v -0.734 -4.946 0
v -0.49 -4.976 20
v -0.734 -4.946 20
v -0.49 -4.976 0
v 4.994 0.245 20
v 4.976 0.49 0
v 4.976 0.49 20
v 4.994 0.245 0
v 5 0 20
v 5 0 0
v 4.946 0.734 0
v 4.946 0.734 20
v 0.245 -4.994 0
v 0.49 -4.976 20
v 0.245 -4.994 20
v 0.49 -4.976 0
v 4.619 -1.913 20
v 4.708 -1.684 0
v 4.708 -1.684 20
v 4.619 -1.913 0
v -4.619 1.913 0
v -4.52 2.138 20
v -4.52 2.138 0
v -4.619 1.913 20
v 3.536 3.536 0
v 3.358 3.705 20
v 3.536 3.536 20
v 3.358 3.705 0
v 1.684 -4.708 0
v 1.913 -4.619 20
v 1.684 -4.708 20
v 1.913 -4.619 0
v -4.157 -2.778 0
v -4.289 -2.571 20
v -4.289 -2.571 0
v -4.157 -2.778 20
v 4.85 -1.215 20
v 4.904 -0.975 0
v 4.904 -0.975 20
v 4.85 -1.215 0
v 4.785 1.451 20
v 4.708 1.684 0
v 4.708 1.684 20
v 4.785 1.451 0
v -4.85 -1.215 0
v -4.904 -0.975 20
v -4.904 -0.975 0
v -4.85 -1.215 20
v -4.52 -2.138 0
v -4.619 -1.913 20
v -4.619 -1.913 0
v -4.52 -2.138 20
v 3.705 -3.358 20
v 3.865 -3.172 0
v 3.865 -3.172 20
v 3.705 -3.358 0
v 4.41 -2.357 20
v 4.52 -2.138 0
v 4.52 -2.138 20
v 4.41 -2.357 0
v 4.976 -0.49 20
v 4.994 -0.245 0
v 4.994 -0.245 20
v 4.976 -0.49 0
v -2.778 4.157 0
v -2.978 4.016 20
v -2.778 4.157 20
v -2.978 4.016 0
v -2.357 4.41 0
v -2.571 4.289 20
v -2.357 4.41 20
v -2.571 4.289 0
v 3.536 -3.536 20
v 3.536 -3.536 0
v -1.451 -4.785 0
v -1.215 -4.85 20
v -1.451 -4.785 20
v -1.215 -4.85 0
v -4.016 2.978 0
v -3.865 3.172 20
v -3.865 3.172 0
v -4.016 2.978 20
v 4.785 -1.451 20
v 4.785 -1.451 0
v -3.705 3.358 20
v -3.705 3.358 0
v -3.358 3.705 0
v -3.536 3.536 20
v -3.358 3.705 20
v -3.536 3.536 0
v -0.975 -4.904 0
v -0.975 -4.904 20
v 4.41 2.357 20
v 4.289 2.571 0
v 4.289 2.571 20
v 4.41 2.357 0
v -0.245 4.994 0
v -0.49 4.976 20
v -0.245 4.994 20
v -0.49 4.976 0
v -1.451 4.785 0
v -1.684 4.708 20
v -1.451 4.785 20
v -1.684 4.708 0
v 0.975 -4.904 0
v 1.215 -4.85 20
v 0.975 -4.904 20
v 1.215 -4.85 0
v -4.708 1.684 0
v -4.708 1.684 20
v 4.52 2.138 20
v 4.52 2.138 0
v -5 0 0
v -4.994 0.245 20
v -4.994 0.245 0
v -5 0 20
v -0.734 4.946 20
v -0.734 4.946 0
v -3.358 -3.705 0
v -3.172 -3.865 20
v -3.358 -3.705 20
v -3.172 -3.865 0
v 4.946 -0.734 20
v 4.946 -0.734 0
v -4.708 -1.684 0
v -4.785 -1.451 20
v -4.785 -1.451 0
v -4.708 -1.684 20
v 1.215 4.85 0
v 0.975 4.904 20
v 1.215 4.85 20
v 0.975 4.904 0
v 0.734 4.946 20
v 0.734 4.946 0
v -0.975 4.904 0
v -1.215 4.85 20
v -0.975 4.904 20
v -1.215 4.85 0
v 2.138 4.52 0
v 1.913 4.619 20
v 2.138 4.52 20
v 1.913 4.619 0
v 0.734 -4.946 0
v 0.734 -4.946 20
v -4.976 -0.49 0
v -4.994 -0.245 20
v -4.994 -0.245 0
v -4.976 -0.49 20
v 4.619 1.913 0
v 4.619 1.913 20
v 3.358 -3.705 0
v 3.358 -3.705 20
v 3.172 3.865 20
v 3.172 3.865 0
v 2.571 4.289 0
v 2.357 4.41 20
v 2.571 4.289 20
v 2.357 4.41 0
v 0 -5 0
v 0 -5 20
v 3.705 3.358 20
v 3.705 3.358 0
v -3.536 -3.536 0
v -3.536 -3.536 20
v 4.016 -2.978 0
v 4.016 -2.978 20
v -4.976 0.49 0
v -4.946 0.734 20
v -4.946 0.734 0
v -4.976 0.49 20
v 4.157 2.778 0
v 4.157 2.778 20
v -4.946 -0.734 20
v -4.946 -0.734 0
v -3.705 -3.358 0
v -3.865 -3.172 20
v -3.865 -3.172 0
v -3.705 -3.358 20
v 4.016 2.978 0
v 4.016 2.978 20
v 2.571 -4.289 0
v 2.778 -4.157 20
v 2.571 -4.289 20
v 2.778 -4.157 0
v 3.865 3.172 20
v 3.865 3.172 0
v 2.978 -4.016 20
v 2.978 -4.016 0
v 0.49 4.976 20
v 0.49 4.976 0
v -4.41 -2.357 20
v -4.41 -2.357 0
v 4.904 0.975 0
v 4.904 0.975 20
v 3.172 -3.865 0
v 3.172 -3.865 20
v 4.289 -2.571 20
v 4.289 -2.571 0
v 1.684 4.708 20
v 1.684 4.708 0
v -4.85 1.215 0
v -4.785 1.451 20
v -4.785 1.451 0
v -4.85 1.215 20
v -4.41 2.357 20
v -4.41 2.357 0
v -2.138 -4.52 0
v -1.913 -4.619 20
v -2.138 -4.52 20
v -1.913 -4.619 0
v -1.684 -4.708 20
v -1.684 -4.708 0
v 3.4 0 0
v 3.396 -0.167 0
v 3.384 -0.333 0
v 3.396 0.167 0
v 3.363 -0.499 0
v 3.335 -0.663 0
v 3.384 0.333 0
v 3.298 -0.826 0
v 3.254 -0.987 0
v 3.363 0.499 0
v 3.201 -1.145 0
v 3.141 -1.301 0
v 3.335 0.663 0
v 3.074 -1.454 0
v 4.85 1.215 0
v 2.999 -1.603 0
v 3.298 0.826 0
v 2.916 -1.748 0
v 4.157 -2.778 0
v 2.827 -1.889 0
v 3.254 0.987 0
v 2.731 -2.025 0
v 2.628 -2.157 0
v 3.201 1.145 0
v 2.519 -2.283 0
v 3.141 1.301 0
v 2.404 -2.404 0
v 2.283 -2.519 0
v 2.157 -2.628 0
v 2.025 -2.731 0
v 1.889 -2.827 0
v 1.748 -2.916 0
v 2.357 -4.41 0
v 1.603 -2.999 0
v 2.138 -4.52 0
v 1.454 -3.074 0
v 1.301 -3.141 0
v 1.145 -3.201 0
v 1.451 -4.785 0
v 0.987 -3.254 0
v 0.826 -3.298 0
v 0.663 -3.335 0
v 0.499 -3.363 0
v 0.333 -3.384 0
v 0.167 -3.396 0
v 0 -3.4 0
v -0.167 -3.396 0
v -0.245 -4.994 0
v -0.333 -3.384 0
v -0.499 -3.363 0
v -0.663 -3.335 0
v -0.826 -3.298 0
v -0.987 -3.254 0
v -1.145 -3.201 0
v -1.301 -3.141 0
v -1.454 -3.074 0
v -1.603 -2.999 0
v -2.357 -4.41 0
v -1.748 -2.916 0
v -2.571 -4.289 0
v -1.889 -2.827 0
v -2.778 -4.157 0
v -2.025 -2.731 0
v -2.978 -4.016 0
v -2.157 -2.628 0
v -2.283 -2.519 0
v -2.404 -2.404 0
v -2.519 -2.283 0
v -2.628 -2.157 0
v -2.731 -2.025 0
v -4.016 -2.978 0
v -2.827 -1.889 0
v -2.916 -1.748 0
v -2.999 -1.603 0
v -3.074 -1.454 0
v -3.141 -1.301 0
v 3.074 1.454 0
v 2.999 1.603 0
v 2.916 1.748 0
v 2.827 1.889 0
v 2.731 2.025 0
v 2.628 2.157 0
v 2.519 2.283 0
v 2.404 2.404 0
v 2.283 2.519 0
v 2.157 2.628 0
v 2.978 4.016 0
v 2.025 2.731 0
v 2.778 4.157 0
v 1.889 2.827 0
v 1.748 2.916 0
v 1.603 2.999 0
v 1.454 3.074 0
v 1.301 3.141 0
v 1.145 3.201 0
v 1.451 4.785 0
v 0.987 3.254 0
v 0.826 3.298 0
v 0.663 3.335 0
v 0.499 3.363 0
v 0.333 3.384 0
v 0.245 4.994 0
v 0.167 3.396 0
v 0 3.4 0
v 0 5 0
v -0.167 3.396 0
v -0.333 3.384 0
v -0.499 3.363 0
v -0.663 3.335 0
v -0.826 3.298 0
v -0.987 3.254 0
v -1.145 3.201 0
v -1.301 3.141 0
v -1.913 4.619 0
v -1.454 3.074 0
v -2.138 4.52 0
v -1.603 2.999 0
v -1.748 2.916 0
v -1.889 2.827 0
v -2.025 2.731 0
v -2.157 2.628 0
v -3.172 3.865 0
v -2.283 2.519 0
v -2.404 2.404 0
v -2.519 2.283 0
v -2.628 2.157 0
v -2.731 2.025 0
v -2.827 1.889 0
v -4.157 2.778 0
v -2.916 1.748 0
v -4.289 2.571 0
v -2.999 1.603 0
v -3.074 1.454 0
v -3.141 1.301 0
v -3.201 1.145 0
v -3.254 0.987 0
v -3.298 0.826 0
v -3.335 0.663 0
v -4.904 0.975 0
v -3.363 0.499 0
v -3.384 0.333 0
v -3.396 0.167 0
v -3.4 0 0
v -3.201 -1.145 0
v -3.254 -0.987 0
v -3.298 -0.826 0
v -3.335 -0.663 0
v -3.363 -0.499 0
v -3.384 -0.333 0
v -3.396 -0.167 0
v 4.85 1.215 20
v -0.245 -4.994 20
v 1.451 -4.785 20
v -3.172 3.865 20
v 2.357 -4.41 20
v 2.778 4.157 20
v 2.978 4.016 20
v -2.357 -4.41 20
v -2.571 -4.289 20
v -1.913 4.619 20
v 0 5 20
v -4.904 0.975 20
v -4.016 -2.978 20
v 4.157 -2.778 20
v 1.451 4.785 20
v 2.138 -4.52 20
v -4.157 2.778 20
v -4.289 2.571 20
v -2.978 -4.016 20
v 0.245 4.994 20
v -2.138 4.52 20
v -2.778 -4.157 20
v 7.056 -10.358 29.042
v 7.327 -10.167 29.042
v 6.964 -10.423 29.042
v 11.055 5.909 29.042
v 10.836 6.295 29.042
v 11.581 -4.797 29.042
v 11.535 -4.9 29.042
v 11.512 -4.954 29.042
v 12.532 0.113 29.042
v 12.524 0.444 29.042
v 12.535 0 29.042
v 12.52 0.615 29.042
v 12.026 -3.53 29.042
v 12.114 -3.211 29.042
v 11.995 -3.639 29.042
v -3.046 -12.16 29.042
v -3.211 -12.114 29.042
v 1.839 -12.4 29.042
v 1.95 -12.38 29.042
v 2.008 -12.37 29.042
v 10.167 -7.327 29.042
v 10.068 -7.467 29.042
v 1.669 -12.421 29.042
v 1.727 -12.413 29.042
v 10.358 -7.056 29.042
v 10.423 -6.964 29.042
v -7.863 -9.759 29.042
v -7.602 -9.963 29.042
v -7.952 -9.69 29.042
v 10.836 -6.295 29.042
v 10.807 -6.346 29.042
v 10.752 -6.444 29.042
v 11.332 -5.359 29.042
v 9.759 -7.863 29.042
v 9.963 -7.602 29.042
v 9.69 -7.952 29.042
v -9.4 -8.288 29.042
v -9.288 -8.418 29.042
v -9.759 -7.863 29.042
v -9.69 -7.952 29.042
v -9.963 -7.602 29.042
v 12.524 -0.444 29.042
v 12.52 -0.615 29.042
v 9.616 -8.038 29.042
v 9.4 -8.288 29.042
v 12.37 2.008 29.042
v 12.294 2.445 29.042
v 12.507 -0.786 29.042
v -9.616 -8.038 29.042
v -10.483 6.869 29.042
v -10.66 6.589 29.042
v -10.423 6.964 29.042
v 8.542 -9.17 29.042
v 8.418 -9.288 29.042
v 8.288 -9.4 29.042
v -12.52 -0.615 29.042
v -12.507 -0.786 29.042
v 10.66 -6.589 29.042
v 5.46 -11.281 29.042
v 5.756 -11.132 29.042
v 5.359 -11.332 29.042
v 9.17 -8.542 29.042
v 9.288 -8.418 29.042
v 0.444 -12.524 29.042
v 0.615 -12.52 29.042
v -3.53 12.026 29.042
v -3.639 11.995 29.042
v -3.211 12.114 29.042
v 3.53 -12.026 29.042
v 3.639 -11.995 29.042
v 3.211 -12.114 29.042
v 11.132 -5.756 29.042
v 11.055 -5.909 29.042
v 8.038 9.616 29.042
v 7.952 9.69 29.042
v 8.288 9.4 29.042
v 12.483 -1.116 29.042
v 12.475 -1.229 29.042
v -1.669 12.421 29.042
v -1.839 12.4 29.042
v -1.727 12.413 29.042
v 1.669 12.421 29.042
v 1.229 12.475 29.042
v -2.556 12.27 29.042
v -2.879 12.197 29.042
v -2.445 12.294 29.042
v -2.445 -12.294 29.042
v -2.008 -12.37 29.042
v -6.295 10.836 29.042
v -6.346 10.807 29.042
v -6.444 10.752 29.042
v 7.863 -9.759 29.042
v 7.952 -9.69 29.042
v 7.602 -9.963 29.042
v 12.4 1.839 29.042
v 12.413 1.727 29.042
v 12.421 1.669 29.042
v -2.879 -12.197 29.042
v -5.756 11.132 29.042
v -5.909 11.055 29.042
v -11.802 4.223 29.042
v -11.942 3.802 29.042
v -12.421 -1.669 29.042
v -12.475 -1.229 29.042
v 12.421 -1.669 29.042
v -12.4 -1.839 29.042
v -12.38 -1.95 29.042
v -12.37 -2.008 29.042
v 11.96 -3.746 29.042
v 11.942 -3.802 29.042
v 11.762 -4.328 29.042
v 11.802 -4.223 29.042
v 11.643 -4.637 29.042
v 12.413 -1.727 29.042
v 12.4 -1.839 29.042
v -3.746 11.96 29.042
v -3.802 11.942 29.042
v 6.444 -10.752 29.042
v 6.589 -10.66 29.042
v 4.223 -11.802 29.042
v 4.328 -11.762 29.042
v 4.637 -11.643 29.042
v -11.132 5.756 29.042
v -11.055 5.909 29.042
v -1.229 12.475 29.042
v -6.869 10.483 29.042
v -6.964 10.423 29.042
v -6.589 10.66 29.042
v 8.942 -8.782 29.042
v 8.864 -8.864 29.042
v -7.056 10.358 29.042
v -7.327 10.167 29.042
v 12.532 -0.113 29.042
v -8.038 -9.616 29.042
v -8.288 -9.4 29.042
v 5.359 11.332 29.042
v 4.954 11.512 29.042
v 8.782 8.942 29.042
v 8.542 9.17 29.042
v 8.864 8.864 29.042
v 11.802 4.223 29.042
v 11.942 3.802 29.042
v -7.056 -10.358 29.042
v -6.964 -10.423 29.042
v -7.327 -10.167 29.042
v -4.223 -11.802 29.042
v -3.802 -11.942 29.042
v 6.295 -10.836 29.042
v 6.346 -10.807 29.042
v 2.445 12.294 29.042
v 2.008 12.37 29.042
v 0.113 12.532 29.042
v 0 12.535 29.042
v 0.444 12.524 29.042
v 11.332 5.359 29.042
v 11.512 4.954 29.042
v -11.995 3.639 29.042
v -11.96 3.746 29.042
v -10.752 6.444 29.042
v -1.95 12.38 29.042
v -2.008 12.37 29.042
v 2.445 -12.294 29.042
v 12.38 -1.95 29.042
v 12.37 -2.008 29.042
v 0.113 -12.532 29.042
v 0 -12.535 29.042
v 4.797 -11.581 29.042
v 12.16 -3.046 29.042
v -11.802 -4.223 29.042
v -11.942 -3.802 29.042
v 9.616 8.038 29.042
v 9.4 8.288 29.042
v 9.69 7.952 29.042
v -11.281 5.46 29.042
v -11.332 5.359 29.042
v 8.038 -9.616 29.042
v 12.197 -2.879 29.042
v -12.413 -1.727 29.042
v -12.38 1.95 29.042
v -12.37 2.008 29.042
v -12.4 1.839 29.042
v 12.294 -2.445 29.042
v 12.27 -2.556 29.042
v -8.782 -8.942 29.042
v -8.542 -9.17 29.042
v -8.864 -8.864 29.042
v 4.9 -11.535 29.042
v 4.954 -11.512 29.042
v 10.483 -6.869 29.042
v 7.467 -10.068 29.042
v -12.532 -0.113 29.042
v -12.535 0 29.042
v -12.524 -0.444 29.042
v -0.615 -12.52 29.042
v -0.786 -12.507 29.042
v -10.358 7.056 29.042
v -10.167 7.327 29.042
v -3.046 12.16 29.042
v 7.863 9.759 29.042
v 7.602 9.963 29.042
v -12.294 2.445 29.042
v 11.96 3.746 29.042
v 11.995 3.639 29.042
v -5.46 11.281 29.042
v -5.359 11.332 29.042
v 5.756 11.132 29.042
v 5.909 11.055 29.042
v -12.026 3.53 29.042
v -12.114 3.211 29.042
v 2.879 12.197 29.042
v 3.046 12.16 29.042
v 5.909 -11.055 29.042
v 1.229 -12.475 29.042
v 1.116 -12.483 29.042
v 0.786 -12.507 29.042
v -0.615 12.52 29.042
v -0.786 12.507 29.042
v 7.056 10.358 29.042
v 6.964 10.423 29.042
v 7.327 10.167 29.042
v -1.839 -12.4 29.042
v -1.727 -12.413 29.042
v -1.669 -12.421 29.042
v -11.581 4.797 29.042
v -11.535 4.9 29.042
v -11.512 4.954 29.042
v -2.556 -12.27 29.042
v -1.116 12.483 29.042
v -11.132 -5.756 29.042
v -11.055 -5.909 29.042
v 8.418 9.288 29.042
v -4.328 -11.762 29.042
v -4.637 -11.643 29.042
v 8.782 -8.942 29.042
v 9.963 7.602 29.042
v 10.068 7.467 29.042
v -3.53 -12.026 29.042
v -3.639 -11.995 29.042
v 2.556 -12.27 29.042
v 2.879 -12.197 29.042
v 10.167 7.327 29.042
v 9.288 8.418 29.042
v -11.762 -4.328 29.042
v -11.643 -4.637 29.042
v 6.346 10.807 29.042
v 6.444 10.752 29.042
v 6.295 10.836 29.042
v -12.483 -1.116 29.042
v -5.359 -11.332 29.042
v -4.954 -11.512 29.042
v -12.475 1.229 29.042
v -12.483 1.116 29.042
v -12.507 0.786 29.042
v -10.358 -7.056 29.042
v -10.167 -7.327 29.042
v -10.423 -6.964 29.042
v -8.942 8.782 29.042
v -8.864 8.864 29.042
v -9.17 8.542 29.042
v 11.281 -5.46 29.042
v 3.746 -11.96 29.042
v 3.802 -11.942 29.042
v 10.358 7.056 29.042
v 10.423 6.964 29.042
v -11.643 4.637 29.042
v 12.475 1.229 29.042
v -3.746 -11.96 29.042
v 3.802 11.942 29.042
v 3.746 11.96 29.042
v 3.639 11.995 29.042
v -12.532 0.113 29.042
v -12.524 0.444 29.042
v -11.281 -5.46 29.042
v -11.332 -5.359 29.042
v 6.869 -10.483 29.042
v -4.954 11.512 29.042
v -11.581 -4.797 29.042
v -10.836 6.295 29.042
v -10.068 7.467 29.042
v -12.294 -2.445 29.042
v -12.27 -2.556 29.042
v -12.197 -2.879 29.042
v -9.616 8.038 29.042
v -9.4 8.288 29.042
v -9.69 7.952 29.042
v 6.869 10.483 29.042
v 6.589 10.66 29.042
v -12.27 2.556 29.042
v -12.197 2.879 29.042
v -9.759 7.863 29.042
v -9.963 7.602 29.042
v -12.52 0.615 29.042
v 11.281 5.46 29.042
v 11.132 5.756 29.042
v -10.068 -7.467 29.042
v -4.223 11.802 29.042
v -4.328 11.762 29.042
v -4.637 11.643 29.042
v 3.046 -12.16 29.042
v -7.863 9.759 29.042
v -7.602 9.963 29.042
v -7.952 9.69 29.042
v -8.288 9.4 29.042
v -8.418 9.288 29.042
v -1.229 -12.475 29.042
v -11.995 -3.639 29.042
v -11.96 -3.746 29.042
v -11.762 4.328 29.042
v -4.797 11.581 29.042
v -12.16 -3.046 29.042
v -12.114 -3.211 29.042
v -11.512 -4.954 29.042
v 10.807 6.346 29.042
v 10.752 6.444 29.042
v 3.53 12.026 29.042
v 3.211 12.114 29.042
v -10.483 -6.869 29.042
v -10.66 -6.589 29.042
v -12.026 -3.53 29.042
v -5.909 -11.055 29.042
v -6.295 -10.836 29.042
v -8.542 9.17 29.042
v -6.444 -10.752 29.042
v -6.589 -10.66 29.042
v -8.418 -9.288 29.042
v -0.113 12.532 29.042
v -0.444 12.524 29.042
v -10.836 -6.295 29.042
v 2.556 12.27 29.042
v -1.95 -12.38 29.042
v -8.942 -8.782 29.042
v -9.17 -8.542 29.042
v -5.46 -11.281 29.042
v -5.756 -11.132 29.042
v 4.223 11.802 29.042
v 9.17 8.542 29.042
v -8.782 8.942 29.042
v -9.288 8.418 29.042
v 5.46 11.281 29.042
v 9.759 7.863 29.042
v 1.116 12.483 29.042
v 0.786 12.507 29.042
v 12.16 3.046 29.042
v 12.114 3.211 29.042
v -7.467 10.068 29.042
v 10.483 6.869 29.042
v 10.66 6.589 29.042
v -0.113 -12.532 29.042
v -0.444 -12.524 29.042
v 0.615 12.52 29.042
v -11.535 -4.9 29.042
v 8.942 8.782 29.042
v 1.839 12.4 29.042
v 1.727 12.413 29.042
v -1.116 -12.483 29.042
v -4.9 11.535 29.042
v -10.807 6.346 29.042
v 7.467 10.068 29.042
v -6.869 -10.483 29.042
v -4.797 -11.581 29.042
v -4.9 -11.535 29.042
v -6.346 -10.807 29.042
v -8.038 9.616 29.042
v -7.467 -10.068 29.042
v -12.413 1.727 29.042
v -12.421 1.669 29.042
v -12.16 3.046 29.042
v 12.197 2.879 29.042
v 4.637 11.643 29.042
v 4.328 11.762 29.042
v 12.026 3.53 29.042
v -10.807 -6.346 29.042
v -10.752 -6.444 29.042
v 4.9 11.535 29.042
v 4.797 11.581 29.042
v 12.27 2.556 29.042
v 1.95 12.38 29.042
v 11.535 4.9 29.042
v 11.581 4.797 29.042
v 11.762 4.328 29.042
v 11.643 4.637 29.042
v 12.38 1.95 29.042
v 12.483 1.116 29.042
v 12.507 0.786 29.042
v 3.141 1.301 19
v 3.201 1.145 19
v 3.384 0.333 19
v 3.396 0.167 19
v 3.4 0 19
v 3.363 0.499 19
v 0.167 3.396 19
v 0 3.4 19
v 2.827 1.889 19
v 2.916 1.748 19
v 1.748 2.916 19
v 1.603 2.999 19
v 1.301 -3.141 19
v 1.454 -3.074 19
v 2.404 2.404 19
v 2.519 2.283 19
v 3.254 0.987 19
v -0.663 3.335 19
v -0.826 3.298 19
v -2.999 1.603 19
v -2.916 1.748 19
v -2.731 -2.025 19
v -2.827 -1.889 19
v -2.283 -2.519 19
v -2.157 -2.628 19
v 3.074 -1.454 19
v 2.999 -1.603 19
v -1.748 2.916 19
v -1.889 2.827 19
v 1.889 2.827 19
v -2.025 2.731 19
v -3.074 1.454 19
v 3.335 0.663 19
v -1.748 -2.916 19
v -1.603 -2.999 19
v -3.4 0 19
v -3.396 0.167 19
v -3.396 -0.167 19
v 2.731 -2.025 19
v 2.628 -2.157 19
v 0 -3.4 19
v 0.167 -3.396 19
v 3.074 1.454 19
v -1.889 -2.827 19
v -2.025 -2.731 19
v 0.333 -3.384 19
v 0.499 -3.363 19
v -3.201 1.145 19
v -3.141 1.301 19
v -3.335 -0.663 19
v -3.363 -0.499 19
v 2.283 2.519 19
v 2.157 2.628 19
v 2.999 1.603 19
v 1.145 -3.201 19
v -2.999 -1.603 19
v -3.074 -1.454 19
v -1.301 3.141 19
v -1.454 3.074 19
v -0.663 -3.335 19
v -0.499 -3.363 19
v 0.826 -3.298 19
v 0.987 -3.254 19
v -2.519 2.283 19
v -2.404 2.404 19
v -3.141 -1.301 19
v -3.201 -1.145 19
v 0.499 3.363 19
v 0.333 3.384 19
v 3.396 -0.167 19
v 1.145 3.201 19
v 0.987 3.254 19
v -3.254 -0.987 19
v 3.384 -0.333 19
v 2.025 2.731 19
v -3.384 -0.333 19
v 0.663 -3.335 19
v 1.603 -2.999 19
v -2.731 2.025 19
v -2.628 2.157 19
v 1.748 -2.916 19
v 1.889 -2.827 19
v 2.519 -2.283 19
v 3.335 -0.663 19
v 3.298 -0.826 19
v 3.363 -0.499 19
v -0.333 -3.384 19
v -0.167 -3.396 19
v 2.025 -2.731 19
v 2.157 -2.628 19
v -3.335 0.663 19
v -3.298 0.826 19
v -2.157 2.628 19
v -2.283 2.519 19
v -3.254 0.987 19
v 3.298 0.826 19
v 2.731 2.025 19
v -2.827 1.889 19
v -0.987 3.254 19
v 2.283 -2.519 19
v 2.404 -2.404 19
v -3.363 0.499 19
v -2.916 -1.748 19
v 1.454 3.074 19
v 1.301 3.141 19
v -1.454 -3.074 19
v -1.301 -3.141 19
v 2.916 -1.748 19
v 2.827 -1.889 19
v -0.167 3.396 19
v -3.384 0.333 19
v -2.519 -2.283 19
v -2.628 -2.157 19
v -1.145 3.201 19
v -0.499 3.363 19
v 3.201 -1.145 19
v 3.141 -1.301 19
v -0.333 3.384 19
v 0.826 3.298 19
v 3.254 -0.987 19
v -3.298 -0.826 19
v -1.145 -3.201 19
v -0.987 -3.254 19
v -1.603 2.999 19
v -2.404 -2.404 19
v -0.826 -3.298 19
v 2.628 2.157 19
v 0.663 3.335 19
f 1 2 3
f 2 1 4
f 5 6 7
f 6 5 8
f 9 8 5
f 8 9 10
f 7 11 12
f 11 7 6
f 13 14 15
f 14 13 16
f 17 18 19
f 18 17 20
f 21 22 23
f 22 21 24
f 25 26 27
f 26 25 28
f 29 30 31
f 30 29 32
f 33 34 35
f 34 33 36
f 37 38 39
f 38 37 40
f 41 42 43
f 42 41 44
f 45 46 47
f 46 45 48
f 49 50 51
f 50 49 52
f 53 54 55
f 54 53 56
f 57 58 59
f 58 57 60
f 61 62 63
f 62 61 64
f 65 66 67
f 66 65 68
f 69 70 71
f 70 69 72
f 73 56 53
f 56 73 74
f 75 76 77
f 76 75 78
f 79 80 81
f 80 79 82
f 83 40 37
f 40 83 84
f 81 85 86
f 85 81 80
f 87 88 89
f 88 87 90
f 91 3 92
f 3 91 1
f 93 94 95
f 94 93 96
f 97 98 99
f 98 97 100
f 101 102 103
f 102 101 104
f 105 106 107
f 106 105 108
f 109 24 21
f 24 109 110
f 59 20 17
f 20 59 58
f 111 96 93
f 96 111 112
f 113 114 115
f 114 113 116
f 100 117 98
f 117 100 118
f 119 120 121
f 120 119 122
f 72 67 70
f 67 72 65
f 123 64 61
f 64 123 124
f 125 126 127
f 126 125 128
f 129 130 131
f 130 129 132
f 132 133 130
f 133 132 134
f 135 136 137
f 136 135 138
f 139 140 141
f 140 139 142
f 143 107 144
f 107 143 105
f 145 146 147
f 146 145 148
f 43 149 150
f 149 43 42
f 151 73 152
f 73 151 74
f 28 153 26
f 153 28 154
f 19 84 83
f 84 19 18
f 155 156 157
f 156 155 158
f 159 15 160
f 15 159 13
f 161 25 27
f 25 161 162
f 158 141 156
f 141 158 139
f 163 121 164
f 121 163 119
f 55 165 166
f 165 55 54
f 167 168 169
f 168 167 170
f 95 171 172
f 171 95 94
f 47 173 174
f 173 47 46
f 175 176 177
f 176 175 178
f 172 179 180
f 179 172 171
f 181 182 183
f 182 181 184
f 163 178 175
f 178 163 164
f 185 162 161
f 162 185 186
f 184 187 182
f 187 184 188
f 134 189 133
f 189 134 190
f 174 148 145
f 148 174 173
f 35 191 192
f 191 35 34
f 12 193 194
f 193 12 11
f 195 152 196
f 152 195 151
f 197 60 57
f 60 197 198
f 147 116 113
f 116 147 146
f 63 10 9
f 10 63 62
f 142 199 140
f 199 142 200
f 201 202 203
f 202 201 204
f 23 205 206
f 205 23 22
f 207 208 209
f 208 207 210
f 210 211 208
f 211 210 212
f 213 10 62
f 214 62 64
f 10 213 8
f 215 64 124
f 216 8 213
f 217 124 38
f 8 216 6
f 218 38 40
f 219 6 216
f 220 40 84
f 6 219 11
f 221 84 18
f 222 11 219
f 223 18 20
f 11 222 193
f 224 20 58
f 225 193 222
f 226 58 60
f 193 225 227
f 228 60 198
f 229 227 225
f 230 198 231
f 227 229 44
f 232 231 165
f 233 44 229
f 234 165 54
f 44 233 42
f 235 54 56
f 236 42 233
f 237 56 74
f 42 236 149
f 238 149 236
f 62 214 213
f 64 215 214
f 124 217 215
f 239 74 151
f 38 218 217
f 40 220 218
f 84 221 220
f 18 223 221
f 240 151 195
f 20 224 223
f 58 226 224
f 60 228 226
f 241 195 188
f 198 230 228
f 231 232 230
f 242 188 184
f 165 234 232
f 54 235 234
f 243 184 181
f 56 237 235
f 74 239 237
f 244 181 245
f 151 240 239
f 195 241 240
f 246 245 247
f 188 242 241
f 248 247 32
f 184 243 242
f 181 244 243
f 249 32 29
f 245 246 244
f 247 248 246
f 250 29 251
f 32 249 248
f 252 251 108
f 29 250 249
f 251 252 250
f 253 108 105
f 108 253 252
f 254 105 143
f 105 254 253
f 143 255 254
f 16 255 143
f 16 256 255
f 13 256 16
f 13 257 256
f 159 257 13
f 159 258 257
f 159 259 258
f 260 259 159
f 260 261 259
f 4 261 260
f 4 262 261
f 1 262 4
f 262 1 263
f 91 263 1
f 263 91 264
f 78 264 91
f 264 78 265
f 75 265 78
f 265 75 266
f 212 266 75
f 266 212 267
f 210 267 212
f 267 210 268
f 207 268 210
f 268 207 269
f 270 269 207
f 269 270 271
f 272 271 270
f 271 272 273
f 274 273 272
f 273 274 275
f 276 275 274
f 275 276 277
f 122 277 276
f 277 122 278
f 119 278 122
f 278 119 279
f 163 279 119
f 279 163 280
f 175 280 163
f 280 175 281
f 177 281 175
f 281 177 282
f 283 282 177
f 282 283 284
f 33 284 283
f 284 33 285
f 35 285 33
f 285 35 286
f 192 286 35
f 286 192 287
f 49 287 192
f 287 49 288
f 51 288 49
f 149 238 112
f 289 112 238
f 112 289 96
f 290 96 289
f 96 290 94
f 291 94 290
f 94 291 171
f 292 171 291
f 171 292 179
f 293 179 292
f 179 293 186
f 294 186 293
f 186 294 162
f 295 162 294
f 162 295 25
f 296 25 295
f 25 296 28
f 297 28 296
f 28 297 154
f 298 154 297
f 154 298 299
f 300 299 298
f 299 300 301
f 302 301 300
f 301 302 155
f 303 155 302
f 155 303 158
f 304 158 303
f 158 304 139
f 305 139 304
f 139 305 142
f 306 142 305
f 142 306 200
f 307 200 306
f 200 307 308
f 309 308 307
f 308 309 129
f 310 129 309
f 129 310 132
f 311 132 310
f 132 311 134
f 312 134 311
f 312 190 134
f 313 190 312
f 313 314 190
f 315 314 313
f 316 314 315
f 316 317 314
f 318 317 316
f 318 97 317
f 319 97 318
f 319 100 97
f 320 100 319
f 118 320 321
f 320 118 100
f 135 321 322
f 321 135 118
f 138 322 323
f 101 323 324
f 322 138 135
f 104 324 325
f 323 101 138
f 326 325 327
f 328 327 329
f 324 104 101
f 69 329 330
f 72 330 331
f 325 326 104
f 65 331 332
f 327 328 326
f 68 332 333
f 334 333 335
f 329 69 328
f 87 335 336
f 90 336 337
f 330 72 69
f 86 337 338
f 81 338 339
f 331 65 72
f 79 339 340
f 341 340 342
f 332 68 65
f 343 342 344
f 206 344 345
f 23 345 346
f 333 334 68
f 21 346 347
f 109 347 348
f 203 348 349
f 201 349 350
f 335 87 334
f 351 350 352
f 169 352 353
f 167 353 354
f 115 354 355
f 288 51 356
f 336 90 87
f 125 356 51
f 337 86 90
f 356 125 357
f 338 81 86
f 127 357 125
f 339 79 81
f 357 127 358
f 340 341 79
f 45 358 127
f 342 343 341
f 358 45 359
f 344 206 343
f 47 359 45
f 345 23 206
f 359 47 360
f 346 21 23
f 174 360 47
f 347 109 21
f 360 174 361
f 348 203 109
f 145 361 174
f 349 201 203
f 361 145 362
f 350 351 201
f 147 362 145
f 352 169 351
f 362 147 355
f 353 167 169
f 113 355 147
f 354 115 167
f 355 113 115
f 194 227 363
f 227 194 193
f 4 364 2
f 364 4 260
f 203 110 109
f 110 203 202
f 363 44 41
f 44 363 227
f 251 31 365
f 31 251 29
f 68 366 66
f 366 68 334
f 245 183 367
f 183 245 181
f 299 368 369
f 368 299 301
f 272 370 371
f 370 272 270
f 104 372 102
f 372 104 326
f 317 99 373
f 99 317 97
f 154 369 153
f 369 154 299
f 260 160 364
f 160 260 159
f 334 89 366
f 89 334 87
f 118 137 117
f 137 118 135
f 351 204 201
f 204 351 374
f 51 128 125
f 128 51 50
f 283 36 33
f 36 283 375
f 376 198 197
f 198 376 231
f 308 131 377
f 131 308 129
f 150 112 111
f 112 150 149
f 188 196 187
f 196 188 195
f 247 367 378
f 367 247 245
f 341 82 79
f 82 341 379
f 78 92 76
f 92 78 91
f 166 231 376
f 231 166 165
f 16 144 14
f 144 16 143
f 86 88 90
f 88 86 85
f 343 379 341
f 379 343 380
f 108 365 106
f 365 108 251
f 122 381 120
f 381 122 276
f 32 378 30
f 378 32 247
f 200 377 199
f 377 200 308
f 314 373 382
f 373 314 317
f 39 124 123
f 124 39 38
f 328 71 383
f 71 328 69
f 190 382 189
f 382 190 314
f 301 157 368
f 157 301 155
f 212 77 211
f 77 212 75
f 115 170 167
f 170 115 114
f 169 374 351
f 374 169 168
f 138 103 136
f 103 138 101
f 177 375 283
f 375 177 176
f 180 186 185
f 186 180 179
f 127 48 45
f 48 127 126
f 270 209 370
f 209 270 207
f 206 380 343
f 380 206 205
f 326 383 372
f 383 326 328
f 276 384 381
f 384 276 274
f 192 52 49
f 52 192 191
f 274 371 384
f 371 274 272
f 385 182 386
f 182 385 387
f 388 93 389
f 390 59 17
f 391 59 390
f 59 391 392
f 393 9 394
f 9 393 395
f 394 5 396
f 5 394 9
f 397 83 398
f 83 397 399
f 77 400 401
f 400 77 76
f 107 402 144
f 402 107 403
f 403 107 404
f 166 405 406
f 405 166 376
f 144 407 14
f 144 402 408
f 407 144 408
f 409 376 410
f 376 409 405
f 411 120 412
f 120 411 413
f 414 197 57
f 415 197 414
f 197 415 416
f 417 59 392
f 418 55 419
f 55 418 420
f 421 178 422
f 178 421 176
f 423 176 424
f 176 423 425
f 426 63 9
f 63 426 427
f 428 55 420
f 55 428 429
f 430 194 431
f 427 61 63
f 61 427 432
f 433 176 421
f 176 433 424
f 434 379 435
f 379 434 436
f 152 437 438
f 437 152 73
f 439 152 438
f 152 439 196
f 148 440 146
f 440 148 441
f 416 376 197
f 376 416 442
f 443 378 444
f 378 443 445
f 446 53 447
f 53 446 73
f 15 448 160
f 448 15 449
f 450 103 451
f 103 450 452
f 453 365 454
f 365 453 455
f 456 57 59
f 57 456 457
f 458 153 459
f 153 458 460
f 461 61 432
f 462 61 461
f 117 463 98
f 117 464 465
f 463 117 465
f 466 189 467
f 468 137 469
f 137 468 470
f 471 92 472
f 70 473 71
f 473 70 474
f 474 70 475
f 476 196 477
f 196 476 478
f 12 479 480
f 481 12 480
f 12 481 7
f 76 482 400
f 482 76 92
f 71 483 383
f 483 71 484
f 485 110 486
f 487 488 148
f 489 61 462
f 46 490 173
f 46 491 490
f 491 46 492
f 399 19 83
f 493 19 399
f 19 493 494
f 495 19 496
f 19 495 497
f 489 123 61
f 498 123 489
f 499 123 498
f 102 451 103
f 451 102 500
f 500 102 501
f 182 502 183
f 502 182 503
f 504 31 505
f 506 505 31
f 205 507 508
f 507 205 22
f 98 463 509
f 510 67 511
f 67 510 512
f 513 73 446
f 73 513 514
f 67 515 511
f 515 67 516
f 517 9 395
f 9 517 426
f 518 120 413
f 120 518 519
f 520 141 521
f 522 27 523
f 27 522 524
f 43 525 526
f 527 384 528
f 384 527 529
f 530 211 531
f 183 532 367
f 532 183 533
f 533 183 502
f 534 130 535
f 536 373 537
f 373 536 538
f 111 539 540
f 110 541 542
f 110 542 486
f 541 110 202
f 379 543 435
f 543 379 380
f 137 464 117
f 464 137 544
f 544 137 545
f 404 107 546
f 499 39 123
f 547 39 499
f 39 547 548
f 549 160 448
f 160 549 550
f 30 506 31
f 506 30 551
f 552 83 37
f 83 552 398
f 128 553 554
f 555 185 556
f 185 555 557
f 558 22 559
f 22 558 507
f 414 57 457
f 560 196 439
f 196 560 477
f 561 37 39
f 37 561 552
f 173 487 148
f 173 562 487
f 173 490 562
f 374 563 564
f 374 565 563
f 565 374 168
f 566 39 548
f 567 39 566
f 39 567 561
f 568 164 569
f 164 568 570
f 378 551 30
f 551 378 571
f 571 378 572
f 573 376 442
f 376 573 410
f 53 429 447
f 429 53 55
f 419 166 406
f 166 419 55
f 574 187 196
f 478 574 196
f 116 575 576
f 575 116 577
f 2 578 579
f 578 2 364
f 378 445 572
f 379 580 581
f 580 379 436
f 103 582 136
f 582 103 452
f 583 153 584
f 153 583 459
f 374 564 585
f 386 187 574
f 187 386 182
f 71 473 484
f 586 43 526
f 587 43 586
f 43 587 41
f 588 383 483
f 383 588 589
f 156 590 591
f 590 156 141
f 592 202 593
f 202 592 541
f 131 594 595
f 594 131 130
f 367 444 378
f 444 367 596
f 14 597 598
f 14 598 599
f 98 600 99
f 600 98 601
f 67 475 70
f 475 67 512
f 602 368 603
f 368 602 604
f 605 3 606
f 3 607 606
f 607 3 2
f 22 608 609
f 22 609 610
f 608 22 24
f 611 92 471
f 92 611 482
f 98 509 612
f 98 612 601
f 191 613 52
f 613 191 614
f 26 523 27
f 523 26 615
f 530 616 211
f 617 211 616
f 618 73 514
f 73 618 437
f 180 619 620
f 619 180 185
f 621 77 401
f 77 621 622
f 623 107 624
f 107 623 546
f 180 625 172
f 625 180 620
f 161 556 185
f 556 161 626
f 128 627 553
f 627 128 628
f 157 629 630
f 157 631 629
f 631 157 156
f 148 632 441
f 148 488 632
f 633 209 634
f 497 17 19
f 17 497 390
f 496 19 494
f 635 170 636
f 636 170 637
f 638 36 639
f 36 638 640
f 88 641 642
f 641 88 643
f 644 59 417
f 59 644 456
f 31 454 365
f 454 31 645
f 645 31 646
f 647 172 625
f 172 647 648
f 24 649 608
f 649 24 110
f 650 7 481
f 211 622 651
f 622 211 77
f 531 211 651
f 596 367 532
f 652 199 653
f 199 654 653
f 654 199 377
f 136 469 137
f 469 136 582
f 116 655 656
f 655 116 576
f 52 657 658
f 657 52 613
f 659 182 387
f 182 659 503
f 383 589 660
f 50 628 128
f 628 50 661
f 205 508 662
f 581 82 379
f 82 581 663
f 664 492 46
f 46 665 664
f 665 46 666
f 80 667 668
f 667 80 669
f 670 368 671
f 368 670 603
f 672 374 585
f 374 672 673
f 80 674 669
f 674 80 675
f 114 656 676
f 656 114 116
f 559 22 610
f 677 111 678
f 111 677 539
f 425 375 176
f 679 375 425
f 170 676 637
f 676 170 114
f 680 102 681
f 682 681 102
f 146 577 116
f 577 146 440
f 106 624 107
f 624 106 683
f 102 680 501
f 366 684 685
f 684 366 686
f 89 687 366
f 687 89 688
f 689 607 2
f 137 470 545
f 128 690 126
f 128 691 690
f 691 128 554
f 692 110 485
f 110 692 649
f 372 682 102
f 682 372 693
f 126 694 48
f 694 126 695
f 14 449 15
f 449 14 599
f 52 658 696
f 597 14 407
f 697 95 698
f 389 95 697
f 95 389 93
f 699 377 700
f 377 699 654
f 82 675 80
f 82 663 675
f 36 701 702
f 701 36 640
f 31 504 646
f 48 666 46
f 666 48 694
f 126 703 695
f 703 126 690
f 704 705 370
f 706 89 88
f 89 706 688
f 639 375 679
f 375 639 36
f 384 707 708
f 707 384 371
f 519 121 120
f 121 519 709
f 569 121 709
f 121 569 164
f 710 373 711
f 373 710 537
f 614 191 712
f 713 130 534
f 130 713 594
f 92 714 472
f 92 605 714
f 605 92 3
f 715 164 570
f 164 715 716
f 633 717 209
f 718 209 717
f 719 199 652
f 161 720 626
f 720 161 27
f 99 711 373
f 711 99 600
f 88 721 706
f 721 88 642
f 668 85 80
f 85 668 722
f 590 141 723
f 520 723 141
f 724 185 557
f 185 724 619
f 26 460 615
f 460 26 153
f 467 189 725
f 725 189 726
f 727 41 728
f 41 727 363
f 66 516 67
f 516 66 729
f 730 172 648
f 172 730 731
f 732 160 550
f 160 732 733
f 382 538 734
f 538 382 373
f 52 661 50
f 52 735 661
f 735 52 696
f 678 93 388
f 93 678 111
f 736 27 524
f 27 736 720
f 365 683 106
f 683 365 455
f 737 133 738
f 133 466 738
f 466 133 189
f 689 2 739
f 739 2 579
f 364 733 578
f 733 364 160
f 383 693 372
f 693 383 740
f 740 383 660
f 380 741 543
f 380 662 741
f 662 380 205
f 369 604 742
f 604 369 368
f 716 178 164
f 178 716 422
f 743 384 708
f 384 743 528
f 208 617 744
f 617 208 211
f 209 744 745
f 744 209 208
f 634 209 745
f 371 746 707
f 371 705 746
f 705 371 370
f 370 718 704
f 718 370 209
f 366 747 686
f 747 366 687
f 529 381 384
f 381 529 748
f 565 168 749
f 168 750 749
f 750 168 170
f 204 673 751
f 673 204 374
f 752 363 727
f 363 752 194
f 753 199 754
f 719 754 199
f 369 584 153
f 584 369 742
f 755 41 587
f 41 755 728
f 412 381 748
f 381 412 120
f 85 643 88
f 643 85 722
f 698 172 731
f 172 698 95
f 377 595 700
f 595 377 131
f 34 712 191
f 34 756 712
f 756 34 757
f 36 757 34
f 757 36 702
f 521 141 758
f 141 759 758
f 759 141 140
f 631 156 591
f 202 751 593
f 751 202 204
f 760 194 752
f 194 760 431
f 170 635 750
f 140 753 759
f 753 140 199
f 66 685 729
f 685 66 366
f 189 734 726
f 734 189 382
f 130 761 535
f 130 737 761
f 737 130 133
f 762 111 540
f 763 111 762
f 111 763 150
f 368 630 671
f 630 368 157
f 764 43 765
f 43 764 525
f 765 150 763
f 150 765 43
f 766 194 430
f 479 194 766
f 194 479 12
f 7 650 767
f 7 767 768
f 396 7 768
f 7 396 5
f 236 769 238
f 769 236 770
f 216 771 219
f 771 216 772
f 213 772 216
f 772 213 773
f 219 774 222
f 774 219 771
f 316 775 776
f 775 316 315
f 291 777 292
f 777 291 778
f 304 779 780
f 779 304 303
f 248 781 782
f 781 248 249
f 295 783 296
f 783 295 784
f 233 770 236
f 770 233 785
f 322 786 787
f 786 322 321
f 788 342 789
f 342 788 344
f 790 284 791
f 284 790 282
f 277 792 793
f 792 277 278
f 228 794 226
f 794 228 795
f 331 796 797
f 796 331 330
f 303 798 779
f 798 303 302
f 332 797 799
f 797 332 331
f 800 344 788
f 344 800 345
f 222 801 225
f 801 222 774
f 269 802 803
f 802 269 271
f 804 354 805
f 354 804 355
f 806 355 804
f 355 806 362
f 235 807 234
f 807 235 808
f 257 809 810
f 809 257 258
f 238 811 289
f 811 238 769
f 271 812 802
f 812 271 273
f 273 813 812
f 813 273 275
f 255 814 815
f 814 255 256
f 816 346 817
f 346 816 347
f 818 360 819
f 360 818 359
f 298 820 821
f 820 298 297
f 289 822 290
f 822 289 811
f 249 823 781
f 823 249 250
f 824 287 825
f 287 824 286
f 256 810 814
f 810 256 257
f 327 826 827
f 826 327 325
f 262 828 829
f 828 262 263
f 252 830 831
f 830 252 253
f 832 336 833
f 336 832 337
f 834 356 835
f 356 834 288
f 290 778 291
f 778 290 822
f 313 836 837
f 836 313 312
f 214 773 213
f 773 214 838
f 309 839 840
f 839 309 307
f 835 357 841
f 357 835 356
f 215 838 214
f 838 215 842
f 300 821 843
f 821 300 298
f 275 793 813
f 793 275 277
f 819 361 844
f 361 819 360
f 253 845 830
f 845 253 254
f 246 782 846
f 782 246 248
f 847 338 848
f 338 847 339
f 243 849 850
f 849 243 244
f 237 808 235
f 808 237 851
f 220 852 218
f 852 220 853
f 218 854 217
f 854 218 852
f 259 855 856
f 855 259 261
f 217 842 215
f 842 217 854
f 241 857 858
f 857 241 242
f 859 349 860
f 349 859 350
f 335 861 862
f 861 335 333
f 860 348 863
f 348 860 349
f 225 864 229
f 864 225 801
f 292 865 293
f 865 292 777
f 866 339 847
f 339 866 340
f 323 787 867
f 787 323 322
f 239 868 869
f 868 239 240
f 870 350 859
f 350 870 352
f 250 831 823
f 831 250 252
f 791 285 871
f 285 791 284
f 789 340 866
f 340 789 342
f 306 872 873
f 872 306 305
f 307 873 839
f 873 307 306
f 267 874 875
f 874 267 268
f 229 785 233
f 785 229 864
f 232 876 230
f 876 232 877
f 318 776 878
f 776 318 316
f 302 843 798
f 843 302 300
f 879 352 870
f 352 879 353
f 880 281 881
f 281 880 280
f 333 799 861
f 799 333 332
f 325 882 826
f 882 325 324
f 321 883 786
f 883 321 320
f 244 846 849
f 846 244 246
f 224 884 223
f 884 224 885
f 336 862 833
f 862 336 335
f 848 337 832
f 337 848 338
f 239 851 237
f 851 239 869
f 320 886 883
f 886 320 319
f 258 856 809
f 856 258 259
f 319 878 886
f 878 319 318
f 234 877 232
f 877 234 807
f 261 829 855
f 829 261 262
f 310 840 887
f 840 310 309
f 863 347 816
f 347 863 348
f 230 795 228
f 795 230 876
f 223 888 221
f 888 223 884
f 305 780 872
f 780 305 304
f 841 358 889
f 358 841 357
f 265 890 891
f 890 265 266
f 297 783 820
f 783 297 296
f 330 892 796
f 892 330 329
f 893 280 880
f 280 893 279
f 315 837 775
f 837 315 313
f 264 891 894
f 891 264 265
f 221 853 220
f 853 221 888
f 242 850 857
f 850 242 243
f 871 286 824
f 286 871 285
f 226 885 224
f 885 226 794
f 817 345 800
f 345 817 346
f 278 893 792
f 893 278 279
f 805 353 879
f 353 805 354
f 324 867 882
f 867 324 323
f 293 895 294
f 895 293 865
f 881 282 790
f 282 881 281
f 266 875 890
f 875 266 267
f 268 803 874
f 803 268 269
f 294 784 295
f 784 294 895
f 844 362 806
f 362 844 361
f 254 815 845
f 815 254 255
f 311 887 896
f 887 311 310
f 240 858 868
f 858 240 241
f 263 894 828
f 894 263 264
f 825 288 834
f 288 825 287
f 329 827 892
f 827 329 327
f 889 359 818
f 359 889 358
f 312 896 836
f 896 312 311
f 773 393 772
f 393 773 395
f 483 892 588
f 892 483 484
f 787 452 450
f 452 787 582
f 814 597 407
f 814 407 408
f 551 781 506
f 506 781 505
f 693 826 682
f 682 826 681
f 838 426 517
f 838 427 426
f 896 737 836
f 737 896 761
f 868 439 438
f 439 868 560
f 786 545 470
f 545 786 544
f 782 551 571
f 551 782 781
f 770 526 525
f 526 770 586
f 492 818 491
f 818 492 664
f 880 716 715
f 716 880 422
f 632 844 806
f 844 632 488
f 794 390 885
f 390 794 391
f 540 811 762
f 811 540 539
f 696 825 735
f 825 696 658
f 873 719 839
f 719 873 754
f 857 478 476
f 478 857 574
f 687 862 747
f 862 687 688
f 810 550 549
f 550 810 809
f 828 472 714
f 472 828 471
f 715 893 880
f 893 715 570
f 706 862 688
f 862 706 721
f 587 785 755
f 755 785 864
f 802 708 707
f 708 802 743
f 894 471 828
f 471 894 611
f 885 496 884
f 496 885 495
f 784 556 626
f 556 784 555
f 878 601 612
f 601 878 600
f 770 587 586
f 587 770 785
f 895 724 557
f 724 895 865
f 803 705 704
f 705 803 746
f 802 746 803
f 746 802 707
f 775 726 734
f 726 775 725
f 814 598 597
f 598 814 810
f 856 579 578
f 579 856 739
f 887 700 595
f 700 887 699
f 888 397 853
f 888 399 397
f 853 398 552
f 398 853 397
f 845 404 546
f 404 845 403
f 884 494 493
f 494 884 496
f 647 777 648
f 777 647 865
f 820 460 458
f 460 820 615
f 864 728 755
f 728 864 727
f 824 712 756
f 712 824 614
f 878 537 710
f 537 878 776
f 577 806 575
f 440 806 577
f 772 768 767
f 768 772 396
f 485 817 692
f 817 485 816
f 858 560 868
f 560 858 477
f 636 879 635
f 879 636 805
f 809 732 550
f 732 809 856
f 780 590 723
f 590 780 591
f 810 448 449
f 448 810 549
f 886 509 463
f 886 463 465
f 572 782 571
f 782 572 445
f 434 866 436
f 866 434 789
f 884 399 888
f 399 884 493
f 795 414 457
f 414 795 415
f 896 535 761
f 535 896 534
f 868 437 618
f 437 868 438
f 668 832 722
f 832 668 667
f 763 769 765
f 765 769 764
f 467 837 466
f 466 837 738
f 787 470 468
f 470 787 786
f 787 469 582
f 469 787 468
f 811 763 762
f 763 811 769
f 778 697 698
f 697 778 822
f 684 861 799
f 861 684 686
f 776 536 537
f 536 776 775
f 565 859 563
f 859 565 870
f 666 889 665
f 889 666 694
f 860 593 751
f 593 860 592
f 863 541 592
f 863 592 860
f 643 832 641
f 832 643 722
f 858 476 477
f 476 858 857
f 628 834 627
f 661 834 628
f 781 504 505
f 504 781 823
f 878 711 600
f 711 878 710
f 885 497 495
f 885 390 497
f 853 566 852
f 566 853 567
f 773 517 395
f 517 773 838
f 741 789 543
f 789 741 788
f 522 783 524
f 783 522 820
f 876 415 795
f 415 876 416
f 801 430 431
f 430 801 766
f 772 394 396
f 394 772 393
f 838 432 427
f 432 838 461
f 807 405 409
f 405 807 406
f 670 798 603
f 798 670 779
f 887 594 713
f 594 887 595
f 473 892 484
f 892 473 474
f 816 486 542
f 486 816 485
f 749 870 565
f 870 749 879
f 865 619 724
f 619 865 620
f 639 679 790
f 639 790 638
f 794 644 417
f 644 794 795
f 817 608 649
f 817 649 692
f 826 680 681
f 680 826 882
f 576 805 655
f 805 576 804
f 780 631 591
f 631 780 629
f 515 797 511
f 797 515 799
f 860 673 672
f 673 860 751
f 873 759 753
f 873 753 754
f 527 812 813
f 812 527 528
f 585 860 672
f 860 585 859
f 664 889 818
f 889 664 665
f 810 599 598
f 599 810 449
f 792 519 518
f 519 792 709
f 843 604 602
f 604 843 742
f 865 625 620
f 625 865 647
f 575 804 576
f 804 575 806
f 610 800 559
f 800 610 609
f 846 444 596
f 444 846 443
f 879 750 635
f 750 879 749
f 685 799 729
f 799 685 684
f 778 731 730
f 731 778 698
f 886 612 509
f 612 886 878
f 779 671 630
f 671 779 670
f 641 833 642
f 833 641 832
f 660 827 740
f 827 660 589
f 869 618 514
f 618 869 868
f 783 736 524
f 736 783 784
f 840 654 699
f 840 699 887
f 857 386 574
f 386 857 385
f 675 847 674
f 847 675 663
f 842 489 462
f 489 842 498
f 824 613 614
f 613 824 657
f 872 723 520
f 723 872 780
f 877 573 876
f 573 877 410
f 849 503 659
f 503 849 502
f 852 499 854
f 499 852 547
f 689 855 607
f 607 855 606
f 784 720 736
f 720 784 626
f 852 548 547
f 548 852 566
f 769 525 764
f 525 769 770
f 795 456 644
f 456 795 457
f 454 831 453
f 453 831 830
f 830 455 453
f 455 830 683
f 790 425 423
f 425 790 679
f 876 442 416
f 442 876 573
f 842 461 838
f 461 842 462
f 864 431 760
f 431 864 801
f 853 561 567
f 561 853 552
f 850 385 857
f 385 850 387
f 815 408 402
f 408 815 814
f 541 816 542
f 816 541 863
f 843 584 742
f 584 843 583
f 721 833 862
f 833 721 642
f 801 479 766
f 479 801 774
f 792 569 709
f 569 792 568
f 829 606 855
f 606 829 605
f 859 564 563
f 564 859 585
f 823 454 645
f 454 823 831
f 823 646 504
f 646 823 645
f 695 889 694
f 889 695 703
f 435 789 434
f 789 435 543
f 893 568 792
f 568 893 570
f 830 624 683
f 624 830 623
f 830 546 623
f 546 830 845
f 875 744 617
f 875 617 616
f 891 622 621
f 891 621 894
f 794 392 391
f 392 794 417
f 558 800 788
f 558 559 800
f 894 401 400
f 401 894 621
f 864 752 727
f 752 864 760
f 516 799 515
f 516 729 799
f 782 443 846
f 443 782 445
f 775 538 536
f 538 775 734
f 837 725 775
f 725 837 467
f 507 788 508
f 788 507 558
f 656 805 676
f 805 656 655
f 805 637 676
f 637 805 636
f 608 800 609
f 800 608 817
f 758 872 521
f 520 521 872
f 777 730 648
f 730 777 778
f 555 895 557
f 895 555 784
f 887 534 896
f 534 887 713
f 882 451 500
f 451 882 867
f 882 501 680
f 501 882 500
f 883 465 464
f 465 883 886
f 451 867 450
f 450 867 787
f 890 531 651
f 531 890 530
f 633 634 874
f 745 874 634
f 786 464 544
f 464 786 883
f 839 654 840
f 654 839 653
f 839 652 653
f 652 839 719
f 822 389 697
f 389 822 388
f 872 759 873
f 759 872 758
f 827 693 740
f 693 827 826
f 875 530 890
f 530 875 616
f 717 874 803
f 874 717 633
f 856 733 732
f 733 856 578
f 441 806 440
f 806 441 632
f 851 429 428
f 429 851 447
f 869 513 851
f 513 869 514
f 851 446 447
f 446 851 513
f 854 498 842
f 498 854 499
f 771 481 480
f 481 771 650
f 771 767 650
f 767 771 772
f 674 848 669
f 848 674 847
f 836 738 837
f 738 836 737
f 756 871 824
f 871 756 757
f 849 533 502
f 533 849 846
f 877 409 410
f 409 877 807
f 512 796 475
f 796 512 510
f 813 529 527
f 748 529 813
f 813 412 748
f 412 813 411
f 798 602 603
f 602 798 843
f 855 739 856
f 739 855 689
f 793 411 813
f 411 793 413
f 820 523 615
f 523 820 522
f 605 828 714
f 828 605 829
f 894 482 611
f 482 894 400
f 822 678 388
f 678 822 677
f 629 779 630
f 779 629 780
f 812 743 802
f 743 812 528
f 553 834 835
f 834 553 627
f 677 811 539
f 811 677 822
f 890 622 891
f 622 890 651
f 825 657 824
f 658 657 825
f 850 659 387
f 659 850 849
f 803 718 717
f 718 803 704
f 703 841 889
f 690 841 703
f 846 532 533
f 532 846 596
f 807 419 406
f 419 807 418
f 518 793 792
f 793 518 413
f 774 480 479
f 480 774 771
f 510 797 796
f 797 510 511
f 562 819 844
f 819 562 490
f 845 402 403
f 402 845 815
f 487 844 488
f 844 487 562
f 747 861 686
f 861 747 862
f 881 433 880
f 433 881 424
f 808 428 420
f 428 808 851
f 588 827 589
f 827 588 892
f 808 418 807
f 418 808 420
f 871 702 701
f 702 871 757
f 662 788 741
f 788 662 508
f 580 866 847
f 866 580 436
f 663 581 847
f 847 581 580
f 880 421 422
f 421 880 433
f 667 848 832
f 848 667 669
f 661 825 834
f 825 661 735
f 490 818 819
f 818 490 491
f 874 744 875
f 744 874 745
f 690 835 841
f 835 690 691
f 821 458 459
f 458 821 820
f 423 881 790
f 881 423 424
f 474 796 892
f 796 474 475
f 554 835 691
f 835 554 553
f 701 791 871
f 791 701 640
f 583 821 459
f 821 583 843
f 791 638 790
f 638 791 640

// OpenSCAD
// Lab funnel - printed upright, wide opening at the top
// All dimensions in millimetres

// ---- Parameters ----
spout_od      = 10;    // outer diameter of straight spout
spout_length  = 20;    // spout runs from z = 0 to z = 20
cone_bottom_d = 10;    // cone outer diameter at z = 20
cone_top_d    = 60;    // rim outer diameter at z = 50
rim_z         = 50;    // height of the funnel rim
wall          = 1.6;   // wall thickness everywhere

$fn = 128;             // smoothness for curved surfaces

// ---- Derived ----
spout_id = spout_od - 2 * wall;   // spout bore = 6.8 mm
cone_h   = rim_z - spout_length;  // cone height = 30 mm

// ---- Model ----
difference() {
    union() {
        // Straight spout from z = 0 to z = 20
        cylinder(d = spout_od, h = spout_length);

        // Cone from z = 20 to z = 50 (open bottom where it meets the spout)
        translate([0, 0, spout_length])
            cylinder(d1 = cone_bottom_d, d2 = cone_top_d, h = cone_h);
    }

    // Bore through the spout
    translate([0, 0, -1])
        cylinder(d = spout_id, h = spout_length + 2);

    // Hollow out the cone so the bore continues up past the rim
    translate([0, 0, spout_length - 1])
        cylinder(d1 = spout_id, d2 = cone_top_d + 2 * wall, h = cone_h + 1);
}
